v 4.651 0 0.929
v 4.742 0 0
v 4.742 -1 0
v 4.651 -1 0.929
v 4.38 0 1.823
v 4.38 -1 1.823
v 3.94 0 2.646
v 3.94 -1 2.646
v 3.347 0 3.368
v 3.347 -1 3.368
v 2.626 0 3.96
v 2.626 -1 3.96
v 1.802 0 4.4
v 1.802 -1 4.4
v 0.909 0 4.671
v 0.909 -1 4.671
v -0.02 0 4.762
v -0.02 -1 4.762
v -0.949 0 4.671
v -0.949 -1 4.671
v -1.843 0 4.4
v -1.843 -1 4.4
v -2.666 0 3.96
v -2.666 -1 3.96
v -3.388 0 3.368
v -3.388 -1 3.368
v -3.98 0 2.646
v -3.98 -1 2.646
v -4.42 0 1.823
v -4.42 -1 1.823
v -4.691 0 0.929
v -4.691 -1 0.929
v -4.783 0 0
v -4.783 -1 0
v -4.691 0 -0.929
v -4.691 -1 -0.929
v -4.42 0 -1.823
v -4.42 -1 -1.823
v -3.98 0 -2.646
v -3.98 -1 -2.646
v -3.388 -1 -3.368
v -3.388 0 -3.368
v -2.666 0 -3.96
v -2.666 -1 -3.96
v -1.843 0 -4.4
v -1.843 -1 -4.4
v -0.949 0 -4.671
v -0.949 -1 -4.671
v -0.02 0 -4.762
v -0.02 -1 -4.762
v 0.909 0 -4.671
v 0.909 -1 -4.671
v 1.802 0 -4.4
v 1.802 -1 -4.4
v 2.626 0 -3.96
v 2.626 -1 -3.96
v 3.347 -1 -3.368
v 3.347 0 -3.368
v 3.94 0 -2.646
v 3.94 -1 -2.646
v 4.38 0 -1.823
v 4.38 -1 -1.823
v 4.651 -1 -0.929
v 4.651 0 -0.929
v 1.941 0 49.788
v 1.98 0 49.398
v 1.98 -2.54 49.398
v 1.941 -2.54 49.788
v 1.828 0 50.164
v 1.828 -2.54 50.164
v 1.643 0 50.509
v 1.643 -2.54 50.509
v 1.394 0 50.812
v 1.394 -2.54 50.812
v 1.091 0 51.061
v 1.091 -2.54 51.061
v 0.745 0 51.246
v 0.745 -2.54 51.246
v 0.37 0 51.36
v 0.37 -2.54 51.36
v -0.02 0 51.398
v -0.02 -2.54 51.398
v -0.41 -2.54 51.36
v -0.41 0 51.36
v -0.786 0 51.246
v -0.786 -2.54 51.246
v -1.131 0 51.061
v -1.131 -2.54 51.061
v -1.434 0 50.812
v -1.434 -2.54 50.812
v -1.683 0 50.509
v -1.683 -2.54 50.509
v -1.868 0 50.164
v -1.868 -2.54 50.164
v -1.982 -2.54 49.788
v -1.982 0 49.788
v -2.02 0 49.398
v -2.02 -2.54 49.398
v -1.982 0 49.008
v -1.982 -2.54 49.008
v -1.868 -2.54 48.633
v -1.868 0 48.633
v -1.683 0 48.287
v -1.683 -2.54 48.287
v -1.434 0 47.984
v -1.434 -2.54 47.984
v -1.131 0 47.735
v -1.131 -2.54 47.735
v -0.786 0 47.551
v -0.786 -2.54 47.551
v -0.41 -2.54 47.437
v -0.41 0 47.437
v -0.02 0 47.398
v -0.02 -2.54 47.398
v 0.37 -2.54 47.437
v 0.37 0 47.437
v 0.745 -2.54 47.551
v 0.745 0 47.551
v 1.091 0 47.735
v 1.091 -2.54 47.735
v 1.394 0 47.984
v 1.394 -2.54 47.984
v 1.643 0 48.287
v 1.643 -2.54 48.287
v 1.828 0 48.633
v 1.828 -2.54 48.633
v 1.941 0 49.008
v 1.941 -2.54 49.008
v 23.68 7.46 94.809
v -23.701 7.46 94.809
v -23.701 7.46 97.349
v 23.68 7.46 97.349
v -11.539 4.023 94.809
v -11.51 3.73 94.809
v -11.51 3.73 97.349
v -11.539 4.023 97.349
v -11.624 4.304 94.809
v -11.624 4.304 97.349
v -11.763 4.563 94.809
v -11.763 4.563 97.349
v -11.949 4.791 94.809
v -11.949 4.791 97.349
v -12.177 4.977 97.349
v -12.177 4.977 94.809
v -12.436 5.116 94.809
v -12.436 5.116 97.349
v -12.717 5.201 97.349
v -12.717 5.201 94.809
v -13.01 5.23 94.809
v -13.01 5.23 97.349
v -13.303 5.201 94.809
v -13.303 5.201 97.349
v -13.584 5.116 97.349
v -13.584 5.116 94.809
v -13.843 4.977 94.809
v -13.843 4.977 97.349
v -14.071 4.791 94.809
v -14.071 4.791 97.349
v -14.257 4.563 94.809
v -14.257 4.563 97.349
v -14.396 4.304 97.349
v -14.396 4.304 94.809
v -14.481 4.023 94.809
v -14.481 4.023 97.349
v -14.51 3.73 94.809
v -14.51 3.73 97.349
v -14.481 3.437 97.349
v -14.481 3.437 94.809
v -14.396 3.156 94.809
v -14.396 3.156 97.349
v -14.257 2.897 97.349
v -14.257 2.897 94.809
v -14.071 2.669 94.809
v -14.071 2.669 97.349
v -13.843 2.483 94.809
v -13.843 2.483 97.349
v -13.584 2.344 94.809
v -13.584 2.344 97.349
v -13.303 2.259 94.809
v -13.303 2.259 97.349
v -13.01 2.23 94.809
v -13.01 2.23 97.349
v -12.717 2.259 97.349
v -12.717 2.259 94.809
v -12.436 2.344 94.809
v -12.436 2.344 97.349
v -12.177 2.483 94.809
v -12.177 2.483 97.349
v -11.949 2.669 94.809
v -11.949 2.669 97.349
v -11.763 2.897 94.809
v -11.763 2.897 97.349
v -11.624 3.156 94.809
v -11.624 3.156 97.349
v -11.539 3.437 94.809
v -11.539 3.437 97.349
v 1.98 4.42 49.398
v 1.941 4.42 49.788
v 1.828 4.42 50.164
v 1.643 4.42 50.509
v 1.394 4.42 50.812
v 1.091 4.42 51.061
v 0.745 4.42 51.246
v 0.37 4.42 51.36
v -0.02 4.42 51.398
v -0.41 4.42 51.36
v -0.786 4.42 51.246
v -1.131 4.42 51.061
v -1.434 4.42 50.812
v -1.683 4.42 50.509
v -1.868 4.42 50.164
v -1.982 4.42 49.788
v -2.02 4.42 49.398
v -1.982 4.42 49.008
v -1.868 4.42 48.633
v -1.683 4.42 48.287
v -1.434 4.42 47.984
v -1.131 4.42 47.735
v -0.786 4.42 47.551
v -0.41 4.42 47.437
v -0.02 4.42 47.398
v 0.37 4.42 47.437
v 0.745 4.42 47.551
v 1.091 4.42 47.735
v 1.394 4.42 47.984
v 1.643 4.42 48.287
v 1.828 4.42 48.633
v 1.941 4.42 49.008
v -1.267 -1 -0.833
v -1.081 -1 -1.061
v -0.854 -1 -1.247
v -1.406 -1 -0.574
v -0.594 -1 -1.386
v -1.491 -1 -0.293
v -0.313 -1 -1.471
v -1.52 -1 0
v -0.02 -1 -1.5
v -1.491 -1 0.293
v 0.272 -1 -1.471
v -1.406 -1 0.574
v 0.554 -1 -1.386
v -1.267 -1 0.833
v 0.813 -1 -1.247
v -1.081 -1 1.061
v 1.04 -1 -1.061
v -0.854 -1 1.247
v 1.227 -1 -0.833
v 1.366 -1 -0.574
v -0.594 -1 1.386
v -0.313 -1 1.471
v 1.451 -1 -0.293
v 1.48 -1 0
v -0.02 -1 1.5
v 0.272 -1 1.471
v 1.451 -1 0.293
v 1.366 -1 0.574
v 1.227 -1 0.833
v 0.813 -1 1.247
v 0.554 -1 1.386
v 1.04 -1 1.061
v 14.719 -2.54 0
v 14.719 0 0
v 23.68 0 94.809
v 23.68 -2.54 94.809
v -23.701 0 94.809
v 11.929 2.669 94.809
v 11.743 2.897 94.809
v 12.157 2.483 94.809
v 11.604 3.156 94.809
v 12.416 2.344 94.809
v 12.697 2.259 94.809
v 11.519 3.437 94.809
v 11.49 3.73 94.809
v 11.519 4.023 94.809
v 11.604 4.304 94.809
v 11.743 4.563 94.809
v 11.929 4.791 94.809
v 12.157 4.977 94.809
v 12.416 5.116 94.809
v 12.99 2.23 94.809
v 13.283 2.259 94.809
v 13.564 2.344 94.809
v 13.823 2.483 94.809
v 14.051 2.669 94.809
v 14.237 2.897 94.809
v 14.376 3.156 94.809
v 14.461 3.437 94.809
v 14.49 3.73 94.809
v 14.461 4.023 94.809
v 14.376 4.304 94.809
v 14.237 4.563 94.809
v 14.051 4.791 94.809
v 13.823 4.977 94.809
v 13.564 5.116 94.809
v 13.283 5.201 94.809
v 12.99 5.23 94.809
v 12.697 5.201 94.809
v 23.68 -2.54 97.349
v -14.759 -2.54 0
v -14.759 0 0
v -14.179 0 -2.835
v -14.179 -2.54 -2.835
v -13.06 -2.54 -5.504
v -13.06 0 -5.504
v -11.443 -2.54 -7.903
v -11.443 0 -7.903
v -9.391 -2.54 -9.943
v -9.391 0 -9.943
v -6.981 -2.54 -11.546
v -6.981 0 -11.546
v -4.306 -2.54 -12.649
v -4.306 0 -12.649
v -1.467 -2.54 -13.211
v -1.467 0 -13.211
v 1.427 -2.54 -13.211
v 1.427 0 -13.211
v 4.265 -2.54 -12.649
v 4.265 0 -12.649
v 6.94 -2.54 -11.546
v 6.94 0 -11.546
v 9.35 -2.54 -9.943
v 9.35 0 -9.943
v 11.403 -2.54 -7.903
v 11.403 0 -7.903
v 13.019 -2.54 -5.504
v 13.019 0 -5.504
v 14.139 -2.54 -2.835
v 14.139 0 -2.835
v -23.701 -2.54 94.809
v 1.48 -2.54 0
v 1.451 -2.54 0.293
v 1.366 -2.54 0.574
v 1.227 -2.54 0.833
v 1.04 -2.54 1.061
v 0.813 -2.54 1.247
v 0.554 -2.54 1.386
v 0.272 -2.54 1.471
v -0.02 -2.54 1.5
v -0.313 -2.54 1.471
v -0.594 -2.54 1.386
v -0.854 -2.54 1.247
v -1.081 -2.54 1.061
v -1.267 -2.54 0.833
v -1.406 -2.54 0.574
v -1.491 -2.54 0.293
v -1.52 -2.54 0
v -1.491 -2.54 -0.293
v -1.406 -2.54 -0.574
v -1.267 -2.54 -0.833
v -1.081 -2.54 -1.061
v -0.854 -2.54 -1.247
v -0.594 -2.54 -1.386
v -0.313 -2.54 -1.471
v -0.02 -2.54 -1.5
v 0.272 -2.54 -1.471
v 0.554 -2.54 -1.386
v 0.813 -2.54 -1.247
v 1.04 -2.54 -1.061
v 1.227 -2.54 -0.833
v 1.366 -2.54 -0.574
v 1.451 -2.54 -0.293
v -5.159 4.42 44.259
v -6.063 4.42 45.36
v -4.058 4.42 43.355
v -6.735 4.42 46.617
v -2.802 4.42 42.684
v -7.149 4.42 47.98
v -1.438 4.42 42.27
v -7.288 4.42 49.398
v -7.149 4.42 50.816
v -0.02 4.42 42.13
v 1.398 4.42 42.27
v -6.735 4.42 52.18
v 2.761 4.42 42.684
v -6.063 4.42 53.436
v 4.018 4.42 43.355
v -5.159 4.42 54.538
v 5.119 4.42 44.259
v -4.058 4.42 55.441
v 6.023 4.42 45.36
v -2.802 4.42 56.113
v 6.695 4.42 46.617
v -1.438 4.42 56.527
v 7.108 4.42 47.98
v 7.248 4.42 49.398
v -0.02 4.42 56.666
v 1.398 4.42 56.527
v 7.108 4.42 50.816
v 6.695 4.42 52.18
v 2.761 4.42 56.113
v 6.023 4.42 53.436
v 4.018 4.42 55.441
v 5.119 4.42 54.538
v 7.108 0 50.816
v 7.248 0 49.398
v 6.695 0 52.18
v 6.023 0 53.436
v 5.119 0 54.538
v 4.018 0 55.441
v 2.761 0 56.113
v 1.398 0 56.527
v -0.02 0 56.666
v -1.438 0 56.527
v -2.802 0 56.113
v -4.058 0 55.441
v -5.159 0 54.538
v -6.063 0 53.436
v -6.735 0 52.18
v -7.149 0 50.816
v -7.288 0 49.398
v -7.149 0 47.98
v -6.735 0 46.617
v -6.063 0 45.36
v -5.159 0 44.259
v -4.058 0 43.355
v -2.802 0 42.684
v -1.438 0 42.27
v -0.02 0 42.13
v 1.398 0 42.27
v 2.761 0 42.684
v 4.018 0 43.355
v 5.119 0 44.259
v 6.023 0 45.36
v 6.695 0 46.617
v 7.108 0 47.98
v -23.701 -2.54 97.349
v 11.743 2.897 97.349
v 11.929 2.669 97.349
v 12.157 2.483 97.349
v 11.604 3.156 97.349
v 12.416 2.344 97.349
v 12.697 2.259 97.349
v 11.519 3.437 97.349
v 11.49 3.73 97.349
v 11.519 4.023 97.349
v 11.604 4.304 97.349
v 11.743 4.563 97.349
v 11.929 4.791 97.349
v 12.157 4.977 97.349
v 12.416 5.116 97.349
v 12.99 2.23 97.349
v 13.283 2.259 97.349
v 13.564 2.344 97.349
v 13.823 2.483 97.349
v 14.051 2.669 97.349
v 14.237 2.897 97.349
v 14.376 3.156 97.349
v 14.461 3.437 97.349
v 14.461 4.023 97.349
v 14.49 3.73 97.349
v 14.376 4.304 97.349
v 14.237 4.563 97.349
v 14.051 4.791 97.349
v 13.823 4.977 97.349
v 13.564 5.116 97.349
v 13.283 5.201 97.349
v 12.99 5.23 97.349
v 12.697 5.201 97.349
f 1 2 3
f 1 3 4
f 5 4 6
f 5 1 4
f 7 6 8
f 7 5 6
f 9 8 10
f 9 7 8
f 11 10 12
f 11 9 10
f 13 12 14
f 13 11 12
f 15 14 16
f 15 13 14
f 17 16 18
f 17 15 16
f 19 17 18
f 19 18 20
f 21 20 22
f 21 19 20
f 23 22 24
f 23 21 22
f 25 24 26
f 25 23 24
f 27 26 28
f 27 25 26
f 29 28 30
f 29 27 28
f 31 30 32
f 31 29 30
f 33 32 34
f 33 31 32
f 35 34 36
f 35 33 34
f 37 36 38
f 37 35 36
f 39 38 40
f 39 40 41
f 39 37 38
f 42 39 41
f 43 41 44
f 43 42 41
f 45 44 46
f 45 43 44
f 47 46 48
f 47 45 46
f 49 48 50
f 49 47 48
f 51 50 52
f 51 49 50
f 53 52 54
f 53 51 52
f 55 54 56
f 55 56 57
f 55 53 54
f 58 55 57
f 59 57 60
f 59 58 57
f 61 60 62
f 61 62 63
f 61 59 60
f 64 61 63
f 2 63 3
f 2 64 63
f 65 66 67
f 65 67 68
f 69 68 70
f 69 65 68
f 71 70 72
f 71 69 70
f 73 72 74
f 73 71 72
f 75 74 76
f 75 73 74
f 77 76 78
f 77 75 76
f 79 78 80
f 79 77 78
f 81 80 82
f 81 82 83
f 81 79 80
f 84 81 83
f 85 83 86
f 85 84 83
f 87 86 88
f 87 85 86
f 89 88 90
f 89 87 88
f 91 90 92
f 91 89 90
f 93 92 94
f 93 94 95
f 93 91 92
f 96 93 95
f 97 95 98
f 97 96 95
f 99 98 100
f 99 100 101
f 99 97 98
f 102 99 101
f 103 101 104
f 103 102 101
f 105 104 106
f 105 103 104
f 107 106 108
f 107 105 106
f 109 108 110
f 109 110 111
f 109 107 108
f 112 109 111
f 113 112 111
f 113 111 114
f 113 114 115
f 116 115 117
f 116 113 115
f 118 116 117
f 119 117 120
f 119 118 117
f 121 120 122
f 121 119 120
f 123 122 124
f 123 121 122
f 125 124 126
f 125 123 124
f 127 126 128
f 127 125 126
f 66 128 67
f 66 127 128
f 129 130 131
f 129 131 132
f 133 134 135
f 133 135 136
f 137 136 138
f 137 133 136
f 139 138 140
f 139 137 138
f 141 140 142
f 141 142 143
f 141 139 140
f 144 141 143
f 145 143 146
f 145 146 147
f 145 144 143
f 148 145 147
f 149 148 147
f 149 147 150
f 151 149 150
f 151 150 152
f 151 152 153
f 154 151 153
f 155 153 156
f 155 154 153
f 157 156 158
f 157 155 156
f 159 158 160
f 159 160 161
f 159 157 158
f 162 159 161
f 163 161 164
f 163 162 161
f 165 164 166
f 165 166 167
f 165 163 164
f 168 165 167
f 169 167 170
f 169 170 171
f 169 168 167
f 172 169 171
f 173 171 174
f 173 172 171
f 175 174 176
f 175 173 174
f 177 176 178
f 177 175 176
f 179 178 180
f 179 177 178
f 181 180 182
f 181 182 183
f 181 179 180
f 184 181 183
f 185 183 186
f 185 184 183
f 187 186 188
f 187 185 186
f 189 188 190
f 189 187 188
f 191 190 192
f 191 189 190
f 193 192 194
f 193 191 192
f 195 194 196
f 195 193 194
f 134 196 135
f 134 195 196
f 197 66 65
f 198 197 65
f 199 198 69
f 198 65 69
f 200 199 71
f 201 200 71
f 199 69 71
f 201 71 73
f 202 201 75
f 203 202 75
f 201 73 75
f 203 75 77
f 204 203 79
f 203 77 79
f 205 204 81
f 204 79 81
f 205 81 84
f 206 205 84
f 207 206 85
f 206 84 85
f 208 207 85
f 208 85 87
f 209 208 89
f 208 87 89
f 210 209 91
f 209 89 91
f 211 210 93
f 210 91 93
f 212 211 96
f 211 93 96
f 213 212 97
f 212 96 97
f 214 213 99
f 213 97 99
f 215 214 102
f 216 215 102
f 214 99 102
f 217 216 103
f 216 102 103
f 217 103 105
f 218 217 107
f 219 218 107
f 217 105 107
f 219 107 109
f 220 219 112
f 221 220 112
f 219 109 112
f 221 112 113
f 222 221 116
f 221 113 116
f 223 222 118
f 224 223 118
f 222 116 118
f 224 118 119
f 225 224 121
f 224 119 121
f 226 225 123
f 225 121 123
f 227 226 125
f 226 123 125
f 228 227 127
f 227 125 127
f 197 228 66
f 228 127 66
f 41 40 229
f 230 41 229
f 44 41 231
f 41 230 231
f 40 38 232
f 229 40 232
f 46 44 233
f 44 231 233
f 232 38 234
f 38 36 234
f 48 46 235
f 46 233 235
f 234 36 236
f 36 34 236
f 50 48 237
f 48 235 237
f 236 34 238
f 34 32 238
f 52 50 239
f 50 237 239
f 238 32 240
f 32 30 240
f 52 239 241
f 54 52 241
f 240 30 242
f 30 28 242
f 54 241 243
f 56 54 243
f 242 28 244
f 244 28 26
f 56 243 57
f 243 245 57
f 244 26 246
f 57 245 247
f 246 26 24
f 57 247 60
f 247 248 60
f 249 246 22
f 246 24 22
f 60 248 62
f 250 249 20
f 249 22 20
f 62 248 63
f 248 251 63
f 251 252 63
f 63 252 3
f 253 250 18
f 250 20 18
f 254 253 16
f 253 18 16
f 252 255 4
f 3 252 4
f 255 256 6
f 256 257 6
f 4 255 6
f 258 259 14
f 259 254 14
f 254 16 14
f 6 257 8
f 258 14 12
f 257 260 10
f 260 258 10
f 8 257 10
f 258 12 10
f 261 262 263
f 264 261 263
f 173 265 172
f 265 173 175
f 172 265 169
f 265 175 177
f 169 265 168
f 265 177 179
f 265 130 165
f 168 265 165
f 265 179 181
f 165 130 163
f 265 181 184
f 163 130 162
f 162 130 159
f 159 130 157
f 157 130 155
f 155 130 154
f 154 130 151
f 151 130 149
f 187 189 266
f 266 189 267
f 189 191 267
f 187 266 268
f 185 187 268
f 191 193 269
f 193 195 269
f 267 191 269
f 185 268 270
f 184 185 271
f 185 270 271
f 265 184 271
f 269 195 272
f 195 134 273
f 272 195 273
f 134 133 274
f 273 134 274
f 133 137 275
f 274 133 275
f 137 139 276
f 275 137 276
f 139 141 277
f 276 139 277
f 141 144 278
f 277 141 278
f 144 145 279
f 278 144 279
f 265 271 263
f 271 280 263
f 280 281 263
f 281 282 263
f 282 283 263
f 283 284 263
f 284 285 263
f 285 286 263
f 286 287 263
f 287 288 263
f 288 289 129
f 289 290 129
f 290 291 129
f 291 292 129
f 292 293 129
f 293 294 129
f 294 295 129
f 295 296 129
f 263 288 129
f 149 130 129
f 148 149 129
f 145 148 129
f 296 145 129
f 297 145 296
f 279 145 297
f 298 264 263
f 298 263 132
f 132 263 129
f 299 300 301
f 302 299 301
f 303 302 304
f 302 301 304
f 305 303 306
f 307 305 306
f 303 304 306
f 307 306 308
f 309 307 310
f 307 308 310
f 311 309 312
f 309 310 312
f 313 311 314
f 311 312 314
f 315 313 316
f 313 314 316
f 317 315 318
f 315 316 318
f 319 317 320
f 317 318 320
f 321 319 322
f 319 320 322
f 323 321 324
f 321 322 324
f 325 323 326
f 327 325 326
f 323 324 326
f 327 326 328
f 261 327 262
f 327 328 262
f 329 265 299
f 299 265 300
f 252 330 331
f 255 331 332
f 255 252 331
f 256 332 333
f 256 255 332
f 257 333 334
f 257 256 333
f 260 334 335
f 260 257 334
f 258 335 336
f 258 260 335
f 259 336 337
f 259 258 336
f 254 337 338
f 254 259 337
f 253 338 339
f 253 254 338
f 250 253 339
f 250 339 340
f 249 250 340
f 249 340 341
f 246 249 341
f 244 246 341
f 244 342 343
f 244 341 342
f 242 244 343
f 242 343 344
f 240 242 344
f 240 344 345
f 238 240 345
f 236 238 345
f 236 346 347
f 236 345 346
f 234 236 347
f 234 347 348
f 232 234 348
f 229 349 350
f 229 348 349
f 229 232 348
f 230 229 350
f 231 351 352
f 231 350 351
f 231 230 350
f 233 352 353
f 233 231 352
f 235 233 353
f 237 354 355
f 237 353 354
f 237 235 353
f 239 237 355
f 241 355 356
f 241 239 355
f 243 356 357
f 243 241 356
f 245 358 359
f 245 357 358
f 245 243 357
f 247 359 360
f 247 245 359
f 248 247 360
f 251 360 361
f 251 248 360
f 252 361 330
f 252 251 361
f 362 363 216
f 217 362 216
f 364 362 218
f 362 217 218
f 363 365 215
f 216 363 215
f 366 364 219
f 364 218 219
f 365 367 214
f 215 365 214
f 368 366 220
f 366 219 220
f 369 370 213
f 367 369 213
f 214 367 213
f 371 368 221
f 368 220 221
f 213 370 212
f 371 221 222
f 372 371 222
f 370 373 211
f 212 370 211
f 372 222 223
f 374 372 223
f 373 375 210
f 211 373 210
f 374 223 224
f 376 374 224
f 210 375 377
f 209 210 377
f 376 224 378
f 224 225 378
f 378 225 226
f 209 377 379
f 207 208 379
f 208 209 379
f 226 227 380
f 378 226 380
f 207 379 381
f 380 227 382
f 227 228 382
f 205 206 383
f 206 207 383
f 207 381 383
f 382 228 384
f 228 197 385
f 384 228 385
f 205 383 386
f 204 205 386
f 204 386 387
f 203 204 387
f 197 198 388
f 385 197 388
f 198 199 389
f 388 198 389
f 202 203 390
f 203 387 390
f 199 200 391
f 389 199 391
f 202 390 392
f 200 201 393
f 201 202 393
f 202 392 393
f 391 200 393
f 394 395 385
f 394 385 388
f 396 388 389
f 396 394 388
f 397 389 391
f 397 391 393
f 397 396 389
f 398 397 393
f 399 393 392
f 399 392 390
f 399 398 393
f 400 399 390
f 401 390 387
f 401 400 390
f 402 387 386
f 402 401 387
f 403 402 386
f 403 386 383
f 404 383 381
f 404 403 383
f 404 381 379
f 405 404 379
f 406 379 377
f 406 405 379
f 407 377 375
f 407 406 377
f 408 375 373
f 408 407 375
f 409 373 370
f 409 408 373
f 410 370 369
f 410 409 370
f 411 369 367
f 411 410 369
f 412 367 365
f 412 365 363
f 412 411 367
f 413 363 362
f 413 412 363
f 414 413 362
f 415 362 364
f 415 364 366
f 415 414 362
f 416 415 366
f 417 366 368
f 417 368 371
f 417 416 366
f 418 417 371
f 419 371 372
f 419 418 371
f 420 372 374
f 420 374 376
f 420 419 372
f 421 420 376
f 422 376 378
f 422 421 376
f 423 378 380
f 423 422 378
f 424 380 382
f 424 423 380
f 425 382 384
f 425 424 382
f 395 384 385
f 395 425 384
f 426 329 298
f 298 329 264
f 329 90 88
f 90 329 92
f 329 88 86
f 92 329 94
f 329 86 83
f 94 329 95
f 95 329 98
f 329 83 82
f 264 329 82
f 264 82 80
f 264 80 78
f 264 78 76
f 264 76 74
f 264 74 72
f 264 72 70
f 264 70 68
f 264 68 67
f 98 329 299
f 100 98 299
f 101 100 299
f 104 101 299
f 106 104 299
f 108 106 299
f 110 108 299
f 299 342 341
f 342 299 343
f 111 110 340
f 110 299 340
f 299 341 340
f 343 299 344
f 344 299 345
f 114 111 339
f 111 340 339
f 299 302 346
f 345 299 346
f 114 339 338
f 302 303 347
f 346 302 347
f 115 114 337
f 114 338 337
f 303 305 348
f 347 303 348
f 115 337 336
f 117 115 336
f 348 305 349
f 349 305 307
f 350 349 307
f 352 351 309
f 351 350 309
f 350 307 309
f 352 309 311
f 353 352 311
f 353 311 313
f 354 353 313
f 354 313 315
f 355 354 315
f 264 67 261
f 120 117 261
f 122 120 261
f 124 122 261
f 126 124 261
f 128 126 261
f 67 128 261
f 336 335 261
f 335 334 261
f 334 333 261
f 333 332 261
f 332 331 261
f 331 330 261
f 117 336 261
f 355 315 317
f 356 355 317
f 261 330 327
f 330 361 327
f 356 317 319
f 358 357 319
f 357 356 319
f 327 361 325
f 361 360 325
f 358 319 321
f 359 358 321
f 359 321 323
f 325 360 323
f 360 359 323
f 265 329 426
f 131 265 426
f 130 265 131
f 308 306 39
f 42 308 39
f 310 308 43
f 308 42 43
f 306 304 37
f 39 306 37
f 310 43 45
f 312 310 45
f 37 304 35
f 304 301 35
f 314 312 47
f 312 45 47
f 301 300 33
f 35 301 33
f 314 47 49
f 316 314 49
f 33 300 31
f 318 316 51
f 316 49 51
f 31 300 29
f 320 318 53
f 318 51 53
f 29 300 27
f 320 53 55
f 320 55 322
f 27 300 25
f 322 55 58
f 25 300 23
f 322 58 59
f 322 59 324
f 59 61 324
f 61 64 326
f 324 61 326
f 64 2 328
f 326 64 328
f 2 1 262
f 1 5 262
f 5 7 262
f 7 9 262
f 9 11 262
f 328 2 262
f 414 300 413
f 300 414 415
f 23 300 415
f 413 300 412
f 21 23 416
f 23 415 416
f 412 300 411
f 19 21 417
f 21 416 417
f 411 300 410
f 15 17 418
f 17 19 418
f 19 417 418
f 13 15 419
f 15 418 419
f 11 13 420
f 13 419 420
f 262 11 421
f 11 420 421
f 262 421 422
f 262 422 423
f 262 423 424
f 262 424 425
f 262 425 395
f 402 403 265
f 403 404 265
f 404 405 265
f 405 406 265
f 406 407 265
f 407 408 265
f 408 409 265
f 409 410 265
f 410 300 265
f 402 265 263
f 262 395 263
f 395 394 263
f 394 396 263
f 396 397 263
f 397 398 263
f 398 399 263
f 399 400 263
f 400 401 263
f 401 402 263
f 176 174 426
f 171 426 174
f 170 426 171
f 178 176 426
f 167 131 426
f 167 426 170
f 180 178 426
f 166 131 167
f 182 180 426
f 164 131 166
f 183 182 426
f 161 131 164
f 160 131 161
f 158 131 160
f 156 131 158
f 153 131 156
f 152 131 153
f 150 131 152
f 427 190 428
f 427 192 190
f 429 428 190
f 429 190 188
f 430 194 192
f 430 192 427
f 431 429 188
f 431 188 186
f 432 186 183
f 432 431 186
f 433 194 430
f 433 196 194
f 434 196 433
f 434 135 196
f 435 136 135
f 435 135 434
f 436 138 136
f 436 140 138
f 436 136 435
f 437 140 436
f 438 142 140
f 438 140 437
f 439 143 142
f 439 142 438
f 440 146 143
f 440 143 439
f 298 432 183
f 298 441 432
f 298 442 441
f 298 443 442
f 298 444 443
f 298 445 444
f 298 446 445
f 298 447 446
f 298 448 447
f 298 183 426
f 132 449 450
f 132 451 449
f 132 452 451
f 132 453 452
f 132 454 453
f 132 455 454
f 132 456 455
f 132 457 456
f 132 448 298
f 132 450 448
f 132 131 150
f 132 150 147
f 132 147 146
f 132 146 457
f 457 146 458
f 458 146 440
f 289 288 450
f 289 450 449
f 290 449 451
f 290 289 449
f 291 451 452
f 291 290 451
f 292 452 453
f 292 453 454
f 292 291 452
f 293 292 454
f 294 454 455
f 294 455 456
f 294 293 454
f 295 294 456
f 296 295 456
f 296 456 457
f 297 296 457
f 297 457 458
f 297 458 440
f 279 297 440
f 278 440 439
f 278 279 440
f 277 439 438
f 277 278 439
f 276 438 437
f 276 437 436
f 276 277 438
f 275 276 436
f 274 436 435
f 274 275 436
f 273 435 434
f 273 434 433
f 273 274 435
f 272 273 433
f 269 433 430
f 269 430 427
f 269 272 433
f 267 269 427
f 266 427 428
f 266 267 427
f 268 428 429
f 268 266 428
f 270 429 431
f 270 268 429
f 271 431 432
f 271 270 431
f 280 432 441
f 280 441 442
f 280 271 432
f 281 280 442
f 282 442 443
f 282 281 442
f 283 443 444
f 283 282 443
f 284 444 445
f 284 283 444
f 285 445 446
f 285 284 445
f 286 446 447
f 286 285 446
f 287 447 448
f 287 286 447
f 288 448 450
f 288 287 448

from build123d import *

# Parameters (mm, degrees)
SKETCH2_R           = 1.999999943
BOSS_EXTRUDE3_DEPTH = 2.54
SKETCH3_W           = 47.380920583
SKETCH3_H           = 10
SKETCH3_R           = 1.5
BOSS_EXTRUDE6_DEPTH = 2.54
SKETCH2_5_R         = 1.5
CUT_EXTRUDE1_DEPTH  = 10
SKETCH2_6_R         = 4.7625
SKETCH2_6_R_2       = 1.5
CUT_EXTRUDE2_DEPTH  = 1
SKETCH2_7_R         = 7.267969402
SKETCH2_7_R_2       = 1.999999943
BOSS_EXTRUDE7_DEPTH = 4.420108


with BuildPart() as part:
    # Sketch2 → Boss-Extrude3 (new body)
    with BuildSketch(Plane.XZ):
        with BuildLine():
            Line((14.71851466, 0), (23.68035712, 94.809011723))
            Line((23.68035712, 94.809011723), (-23.700563463, 94.809011723))
            Line((-23.700563463, 94.809011723), (-14.758927346, 0))
            ThreePointArc((-14.758927346, 0), (-0.020206343, -13.282171548), (14.71851466, 0))
        make_face()
        with Locations((-0.020206343, 49.398276345)):
            Circle(SKETCH2_R, mode=Mode.SUBTRACT)
    extrude(amount=BOSS_EXTRUDE3_DEPTH)

    # Sketch3 → Boss-Extrude6 (add)
    with BuildSketch(Plane.XY.offset(94.809011723)):
        with Locations((-0.010103172, 2.46)):
            Rectangle(SKETCH3_W, SKETCH3_H)
        with Locations((-13.010103172, 3.73)):
            Circle(SKETCH3_R, mode=Mode.SUBTRACT)
        with Locations((12.989896828, 3.73)):
            Circle(SKETCH3_R, mode=Mode.SUBTRACT)
    extrude(amount=BOSS_EXTRUDE6_DEPTH)

    # Sketch2<5> → Cut-Extrude1 (cut)
    with BuildSketch(Plane.XZ):
        with Locations((-0.020206343, 0)):
            Circle(SKETCH2_5_R)
    extrude(amount=CUT_EXTRUDE1_DEPTH, mode=Mode.SUBTRACT)

    # Sketch2<6> → Cut-Extrude2 (cut)
    with BuildSketch(Plane.XZ):
        with Locations((-0.020206343, 0)):
            Circle(SKETCH2_6_R)
        with Locations((-0.020206343, 0)):
            Circle(SKETCH2_6_R_2, mode=Mode.SUBTRACT)
    extrude(amount=CUT_EXTRUDE2_DEPTH, mode=Mode.SUBTRACT)

    # Sketch2<7> → Boss-Extrude7 (add)
    with BuildSketch(Plane.XZ):
        with Locations((-0.020206343, 49.398276345)):
            Circle(SKETCH2_7_R)
        with Locations((-0.020206343, 49.398276345)):
            Circle(SKETCH2_7_R_2, mode=Mode.SUBTRACT)
    extrude(amount=-BOSS_EXTRUDE7_DEPTH)


solid = part.part
